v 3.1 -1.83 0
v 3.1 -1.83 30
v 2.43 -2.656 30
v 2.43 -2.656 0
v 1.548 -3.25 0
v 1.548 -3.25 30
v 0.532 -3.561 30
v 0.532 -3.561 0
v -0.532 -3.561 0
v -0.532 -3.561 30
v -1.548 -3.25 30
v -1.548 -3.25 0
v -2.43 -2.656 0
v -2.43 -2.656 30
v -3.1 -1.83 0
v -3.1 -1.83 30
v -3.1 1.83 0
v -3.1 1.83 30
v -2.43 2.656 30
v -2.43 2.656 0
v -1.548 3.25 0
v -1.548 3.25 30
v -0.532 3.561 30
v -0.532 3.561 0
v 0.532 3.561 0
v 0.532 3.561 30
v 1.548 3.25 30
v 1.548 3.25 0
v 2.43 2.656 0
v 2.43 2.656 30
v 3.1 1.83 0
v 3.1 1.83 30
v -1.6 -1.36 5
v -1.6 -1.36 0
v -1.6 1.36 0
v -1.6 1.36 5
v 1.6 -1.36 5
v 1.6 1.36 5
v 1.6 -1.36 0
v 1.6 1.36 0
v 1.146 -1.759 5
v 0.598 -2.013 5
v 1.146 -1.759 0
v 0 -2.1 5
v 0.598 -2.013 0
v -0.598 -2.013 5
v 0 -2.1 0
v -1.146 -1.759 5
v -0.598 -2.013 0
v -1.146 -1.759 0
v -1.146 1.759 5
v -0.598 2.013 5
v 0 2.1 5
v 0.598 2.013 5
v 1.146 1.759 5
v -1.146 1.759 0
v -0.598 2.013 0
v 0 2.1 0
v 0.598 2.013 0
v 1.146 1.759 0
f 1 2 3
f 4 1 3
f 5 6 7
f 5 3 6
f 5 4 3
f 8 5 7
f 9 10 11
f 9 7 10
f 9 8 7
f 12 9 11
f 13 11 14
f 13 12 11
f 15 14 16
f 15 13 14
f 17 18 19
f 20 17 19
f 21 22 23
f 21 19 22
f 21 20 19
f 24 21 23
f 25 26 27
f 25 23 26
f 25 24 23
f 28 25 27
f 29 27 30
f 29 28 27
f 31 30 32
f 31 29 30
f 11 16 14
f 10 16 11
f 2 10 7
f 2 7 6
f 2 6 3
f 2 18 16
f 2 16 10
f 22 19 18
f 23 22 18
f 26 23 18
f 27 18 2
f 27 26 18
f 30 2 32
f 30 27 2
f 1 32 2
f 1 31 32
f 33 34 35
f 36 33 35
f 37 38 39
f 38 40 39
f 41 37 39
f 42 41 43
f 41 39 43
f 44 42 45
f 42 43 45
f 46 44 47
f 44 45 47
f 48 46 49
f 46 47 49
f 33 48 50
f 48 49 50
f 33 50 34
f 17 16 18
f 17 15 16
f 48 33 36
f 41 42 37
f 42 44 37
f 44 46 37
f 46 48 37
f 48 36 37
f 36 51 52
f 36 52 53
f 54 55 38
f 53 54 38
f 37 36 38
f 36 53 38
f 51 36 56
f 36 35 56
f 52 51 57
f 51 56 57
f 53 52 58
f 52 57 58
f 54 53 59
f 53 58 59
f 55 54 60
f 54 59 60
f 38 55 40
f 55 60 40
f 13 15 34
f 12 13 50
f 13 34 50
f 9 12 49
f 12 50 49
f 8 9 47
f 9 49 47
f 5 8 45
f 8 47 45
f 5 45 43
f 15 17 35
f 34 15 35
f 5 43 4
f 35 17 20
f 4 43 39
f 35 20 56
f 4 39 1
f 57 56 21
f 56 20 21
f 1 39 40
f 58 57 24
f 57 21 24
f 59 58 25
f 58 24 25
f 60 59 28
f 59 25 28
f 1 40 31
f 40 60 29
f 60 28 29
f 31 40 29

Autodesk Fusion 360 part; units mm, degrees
sketch "Sketch1" plane through (0, 0, 0) normal (0, 0, 1) x (1, 0, 0)
  line L0 (1.3229, -1.5) -> (-1.3229, -1.5)
  line L1 (-1.5, -1.3229) -> (-1.5, 1.3229)
  line L2 (-1.3229, 1.5) -> (1.3229, 1.5)
  line L3 (1.5, 1.3229) -> (1.5, -1.3229)
  line L4 (1.5, -1.5) -> (-1.5, 1.5) construction
  line L5 (-1.5, -1.5) -> (1.5, 1.5) construction
  arc A0 (-1.5, -1.3229) -> (1.5, -1.3229) centre (0, 0) ccw
  arc A1 (1.5, 1.3229) -> (-1.5, 1.3229) centre (0, 0) ccw
  line L6 (-3, -1.8028) -> (-3, 1.8028)
  arc A2 (3, 1.8028) -> (-3, 1.8028) centre (0, 0) ccw
  line L7 (3, 1.8028) -> (3, -1.8028)
  arc A3 (-3, -1.8028) -> (3, -1.8028) centre (0, 0) ccw
  dimension "d1" = 4
  dimension "d2" = 3
  dimension "d3" = 3
  dimension "d4" = 1.5
extrude "Extrude1" add sketch "Sketch1" along normal blind 30 contours L0 A0 | L0 L1 L2 L3 A0 A1 | L2 A1 | L6 A2 L7 A3 makes body 1
extrude "Extrude2" cut sketch "Sketch1" along normal blind 5 contours L0 A0 | L0 L1 L2 L3 A0 A1 | L2 A1 bodies 1
sketch "Sketch2" plane through (0, 0, 0) normal (0, 0, 1) x (1, 0, 0)
  line L0 (1.3601, -1.6) -> (-1.3601, -1.6)
  line L1 (-1.6, -1.3601) -> (-1.6, 1.3601)
  line L2 (-1.3601, 1.6) -> (1.3601, 1.6)
  line L3 (1.6, 1.3601) -> (1.6, -1.3601)
  line L4 (1.6, -1.6) -> (-1.6, 1.6) construction
  line L5 (-1.6, -1.6) -> (1.6, 1.6) construction
  arc A0 (-1.6, -1.3601) -> (1.6, -1.3601) centre (0, 0) ccw
  arc A1 (1.6, 1.3601) -> (-1.6, 1.3601) centre (0, 0) ccw
  line L6 (-3.1, -1.8303) -> (-3.1, 1.8303)
  arc A2 (3.1, 1.8303) -> (-3.1, 1.8303) centre (0, 0) ccw
  line L7 (3.1, 1.8303) -> (3.1, -1.8303)
  arc A3 (-3.1, -1.8303) -> (3.1, -1.8303) centre (0, 0) ccw
  dimension "d9" = 4.2
  dimension "d10" = 3.2
  dimension "d11" = 3.2
  dimension "d12" = 1.5
extrude "Extrude3" add sketch "Sketch2" along normal blind 30 separate body contours L0 A0 | L0 L1 L2 L3 A0 A1 | L2 A1 | L6 A2 L7 A3 makes body 2
extrude "Extrude4" cut sketch "Sketch2" along normal blind 5 contours L0 A0 | L0 L1 L2 L3 A0 A1 | L2 A1 bodies 2
hidden bodies 1
